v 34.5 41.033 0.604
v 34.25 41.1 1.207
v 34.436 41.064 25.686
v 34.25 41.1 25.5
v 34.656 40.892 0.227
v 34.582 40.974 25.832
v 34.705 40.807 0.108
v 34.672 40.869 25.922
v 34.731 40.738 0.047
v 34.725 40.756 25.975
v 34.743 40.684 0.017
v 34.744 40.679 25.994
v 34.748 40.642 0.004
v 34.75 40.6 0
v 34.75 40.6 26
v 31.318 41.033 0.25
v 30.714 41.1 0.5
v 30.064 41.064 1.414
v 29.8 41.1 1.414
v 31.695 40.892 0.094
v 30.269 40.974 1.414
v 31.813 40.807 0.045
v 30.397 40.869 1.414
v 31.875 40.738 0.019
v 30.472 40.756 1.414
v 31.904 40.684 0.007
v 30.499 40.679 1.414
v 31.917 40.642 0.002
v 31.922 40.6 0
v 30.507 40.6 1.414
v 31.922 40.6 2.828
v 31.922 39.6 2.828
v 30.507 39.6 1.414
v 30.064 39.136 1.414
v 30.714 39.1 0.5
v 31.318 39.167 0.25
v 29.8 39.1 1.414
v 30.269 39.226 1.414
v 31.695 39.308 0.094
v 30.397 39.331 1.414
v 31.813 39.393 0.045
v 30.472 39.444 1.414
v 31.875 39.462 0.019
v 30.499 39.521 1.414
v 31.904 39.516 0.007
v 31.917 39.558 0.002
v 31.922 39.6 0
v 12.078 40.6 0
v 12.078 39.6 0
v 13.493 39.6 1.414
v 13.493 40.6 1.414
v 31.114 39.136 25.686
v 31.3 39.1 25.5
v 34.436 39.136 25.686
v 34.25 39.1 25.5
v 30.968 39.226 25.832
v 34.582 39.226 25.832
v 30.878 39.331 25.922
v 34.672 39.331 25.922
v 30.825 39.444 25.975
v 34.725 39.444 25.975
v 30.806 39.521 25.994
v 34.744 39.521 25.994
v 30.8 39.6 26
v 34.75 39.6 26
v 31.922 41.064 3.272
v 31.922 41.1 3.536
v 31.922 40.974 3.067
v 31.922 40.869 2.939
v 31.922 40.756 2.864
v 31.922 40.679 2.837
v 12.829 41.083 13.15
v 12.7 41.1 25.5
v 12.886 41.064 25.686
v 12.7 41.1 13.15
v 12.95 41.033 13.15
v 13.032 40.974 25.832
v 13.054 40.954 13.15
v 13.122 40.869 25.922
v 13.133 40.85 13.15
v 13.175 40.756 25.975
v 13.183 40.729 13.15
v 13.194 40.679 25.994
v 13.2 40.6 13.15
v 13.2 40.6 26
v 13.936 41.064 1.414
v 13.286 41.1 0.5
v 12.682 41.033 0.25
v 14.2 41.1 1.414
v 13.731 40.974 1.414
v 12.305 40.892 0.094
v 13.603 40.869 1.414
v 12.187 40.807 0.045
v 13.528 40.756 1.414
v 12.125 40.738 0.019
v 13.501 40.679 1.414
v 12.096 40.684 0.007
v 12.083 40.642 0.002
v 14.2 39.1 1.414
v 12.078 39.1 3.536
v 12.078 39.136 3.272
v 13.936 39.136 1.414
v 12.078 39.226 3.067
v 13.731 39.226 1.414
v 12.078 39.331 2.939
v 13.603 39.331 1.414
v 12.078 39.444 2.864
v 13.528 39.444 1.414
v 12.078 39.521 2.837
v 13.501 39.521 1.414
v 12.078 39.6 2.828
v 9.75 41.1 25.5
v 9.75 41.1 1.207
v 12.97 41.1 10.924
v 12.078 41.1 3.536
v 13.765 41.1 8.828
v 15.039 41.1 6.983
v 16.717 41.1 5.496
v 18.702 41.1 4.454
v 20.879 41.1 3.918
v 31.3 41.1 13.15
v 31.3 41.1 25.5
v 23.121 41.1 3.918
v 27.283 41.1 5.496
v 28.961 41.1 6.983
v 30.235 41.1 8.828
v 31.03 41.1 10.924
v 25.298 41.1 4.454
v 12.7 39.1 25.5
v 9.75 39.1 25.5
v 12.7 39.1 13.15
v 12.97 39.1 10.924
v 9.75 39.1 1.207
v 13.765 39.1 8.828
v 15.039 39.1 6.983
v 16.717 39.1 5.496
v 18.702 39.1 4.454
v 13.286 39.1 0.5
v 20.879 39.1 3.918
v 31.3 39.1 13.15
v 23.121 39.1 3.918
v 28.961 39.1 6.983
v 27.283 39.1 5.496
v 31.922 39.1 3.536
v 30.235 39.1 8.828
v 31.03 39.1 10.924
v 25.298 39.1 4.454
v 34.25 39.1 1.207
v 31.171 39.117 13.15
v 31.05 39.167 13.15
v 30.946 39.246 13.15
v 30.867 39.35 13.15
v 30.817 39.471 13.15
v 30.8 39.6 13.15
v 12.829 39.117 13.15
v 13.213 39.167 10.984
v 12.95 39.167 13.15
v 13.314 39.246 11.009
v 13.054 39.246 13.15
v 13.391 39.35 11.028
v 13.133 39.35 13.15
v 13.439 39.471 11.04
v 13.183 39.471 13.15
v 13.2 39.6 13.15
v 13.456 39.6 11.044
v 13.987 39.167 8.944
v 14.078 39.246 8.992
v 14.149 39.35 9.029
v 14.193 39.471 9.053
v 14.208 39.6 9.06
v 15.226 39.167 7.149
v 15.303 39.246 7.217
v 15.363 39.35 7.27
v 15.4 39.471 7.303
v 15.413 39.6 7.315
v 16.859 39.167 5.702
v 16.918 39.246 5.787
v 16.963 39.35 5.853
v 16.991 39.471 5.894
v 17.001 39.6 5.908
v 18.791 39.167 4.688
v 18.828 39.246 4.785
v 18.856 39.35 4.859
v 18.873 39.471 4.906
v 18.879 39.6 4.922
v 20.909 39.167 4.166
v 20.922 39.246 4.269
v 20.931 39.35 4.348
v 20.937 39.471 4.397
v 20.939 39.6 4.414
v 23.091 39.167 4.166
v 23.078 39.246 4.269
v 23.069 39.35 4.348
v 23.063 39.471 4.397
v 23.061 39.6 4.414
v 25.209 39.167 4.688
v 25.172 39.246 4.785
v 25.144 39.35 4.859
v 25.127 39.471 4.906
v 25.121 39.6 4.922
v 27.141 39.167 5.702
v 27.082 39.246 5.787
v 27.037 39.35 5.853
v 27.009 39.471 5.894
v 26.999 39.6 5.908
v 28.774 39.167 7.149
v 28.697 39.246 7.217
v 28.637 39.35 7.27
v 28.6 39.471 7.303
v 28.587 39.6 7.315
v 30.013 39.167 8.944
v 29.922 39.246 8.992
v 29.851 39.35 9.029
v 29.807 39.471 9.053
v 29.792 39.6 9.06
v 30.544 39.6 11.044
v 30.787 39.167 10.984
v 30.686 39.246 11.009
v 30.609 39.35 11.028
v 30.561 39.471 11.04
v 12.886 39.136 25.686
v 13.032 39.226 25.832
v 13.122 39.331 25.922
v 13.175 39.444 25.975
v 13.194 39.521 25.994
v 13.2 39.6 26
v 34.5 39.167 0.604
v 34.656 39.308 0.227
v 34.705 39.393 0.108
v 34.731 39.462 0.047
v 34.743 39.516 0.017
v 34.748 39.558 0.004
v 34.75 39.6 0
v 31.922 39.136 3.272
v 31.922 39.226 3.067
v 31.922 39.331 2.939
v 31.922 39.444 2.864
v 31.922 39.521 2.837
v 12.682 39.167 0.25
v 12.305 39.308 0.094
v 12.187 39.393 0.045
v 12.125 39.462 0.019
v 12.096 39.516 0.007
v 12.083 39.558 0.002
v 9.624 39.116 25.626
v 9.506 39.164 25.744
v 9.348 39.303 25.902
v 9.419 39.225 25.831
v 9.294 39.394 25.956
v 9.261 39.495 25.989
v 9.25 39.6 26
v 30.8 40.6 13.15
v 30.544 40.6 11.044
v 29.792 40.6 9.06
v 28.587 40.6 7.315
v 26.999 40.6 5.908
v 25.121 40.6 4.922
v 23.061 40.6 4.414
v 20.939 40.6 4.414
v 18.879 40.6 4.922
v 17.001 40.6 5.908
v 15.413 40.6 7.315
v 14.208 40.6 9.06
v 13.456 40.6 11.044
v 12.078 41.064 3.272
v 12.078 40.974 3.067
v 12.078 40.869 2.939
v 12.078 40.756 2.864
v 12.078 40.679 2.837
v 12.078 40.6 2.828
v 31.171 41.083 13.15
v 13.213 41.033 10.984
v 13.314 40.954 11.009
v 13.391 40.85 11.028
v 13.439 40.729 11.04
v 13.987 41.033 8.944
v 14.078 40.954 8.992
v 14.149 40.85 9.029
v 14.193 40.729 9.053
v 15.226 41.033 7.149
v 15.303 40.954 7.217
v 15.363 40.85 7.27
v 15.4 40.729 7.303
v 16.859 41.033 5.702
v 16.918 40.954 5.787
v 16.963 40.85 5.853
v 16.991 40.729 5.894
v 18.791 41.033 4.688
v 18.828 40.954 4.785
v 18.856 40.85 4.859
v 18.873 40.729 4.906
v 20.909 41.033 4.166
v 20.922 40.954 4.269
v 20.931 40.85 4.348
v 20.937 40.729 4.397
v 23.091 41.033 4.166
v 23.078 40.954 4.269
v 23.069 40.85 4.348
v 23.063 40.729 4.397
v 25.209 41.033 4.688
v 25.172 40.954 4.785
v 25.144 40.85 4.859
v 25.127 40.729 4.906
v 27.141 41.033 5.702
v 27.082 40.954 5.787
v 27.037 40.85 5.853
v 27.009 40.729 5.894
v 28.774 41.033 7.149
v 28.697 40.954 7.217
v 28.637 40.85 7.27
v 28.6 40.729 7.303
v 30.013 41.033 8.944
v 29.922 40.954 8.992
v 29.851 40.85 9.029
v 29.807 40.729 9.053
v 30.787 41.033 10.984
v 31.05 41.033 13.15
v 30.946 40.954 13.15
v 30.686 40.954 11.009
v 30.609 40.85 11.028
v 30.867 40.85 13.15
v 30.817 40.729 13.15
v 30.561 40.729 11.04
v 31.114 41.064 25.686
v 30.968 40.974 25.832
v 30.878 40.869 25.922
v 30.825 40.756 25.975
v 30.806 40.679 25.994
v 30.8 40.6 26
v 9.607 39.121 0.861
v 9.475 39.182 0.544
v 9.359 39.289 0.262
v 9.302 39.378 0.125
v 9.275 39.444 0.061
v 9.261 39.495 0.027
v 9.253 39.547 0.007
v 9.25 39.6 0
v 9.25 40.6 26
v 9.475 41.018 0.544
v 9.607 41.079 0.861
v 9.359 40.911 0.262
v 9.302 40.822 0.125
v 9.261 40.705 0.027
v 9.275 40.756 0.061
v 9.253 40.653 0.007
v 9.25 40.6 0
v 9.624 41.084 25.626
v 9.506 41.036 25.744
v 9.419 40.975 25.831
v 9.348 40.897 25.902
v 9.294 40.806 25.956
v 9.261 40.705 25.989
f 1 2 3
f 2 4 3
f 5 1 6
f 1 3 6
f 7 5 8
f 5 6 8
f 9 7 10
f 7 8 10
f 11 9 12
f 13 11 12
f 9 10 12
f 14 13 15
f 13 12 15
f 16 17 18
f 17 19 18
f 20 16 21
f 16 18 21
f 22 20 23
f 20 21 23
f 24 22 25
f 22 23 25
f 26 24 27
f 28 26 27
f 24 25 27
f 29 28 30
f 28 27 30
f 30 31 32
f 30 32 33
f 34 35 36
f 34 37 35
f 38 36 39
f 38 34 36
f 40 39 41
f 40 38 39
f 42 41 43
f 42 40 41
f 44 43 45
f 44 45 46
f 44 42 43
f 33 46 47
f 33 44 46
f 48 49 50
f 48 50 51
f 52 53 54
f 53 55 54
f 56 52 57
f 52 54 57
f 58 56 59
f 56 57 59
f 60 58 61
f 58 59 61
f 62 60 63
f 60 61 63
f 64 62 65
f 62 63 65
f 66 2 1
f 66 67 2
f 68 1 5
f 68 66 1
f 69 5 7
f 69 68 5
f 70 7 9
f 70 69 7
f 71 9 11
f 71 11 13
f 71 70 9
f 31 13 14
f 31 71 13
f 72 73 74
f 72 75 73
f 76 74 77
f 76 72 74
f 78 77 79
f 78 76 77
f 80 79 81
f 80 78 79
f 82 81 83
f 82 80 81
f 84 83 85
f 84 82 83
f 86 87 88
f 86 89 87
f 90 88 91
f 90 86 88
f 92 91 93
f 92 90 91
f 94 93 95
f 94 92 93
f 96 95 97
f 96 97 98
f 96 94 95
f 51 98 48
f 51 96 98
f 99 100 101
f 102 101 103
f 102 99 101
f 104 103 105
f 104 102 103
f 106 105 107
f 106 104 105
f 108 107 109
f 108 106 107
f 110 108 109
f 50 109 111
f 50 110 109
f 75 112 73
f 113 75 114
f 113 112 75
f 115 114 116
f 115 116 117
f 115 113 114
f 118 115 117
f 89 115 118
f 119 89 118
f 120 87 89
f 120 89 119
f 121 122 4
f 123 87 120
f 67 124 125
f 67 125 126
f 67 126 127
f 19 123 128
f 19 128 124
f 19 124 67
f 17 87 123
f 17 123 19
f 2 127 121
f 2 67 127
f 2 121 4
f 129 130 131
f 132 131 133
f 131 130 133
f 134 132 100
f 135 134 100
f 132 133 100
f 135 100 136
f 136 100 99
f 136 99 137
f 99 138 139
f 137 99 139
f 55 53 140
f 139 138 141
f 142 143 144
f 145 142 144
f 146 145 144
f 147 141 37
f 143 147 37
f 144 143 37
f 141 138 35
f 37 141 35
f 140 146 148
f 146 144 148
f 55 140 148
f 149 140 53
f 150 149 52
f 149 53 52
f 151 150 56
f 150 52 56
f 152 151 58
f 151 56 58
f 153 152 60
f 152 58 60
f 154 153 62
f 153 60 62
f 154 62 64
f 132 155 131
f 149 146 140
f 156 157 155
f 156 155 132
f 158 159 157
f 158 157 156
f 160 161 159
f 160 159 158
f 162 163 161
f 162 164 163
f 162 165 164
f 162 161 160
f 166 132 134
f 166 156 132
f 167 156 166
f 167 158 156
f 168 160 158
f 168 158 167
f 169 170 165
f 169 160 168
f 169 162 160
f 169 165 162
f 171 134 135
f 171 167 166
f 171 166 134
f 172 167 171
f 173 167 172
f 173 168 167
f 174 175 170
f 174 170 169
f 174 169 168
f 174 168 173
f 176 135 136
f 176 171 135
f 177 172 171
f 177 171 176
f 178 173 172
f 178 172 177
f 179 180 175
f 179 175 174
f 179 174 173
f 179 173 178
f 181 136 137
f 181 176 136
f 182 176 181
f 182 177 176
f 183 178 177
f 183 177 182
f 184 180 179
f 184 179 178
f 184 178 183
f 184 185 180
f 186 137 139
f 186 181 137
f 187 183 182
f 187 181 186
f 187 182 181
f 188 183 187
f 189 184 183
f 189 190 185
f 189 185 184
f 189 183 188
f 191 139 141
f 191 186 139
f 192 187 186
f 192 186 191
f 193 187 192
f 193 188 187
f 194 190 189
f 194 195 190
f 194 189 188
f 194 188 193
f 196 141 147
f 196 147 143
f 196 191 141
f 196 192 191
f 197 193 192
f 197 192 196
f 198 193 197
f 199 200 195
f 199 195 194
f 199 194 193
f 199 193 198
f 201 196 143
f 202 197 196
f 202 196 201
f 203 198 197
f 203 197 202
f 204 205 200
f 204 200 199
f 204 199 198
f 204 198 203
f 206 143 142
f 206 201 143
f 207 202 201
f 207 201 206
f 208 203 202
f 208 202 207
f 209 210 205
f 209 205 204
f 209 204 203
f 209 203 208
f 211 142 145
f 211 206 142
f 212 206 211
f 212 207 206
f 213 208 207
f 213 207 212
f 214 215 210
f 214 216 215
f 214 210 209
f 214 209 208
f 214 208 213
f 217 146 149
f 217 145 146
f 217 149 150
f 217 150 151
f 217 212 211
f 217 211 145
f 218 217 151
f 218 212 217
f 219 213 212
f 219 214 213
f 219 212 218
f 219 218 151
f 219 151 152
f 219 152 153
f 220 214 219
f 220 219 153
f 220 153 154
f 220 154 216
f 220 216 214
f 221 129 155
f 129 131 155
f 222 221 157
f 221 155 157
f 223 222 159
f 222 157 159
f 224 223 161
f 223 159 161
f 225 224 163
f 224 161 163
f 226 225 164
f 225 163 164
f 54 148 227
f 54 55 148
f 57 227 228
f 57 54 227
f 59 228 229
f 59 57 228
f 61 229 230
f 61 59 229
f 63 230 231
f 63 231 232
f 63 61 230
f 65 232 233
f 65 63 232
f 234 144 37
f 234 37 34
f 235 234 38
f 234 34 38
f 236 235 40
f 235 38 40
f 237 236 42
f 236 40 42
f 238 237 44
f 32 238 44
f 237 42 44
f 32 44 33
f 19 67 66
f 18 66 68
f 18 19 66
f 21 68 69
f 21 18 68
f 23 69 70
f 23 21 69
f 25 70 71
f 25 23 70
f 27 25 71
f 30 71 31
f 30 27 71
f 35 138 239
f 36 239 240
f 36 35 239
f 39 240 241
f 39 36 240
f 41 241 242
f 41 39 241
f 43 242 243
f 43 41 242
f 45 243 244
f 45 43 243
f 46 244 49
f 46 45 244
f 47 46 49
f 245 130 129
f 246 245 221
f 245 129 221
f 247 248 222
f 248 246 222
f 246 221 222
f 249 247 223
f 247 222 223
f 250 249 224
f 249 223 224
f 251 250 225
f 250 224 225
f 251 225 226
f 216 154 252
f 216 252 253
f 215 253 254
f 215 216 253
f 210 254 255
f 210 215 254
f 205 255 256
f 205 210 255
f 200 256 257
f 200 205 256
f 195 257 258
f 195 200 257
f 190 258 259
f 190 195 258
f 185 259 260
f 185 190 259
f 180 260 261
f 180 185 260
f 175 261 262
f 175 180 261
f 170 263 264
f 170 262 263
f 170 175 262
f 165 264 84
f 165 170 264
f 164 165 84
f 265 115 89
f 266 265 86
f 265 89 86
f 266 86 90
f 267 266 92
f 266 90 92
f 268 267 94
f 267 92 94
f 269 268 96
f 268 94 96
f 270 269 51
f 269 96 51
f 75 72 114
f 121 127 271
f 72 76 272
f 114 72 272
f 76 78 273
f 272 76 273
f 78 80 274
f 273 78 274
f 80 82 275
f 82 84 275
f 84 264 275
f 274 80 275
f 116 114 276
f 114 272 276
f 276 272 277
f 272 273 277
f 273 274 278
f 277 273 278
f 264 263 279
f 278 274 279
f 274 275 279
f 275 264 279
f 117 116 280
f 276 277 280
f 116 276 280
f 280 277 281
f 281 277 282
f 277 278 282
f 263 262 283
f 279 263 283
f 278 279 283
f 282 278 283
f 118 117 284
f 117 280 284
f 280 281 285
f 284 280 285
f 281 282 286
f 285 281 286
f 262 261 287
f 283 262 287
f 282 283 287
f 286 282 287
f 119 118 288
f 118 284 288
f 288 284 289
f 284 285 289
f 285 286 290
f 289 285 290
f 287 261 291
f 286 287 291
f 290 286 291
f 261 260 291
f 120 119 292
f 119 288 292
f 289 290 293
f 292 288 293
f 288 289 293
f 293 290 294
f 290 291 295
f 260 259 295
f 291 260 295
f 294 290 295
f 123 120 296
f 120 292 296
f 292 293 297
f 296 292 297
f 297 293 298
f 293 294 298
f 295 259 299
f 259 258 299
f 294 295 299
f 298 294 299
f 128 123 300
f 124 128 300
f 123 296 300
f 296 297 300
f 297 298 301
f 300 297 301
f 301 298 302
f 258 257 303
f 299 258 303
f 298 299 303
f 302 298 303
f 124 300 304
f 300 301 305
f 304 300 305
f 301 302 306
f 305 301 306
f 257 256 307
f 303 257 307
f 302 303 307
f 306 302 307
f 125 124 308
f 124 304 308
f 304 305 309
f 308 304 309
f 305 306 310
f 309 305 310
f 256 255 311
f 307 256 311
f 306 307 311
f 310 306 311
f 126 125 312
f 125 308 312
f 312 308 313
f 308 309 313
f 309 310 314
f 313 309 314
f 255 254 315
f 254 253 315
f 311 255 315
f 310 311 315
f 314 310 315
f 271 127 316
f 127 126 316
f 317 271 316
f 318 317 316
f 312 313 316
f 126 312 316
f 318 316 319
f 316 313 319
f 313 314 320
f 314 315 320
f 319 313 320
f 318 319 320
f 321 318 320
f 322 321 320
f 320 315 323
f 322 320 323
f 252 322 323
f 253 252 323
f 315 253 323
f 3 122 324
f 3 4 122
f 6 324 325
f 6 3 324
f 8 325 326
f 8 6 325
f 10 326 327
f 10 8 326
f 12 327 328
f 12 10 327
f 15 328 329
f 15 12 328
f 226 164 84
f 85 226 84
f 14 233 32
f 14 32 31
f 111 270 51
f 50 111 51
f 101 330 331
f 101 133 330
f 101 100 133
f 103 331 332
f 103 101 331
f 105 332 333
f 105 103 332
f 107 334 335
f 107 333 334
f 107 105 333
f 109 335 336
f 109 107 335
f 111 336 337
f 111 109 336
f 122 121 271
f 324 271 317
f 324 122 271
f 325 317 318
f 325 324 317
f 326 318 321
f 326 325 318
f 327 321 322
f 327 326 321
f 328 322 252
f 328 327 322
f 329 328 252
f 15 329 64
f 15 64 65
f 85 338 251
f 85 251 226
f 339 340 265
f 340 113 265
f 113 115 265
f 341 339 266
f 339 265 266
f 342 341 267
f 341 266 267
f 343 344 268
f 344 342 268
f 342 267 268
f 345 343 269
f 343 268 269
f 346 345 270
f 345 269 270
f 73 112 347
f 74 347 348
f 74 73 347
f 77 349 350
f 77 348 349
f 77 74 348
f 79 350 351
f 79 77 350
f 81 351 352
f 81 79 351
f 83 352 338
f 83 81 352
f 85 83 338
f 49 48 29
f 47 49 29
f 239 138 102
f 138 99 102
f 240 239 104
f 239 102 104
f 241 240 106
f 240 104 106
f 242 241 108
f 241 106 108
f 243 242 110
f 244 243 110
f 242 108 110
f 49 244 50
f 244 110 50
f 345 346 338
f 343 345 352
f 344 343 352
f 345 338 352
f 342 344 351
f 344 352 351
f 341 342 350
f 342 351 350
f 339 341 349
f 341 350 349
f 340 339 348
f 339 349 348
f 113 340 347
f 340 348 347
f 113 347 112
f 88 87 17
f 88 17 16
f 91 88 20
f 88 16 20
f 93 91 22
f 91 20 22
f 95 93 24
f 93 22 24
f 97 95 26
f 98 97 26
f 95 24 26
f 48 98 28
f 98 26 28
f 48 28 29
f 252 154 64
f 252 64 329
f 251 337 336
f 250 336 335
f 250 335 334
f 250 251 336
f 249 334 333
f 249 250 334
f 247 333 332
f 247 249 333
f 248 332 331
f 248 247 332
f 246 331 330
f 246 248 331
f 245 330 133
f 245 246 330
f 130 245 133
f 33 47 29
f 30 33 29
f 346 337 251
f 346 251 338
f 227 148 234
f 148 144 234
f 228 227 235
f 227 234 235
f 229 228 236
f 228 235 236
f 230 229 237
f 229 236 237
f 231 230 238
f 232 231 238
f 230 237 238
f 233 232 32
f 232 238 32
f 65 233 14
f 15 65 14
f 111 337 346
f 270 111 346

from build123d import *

# Parameters (mm, degrees)
BOX026_W               = 2
BOX026_H               = 2
BOX026_DEPTH           = 4
BOX026_PLACEMENT_ANGLE = 45
BOX027_W               = 2
BOX027_H               = 2
BOX027_DEPTH           = 4
BOX027_PLACEMENT_ANGLE = 45
BOX025_W               = 17.6
BOX025_H               = 2
BOX025_DEPTH           = 12.85
CYLINDER063_R          = 8.8
CYLINDER063_DEPTH      = 2
BOX024_W               = 25.5
BOX024_H               = 2
BOX024_DEPTH           = 26
FILLET_R               = 0.5


with BuildPart() as noutletkeynotch:
    # Box026 → Box026 (new body)
    with BuildSketch(Plane.XY):
        with Locations((1, 1)):
            Rectangle(BOX026_W, BOX026_H)
    extrude(amount=BOX026_DEPTH)


with BuildPart() as noutletkeynotch_1:
    # Box026 placement: moved
    add(noutletkeynotch.part.moved(Location((-12.75, 0, -13.15))).rotate(Axis((-12.75, 0, -13.15), (0, 1, 0)), BOX026_PLACEMENT_ANGLE))


with BuildPart() as noutletkeynotch2:
    # Part__Mirroring006: instance of nOutletKeyNotch
    add(noutletkeynotch_1.part.mirror(Plane(origin=(0, 0, 0), x_dir=(0, -1, 0), z_dir=(1, 0, 0))))


with BuildPart() as noutletkeynotch1:
    # Box027 → Box027 (new body)
    with BuildSketch(Plane.XY):
        with Locations((1, 1)):
            Rectangle(BOX027_W, BOX027_H)
    extrude(amount=BOX027_DEPTH)


with BuildPart() as noutletkeynotch1_1:
    # Box027 placement: moved
    add(noutletkeynotch1.part.moved(Location((-12.75, 0, -13.15))).rotate(Axis((-12.75, 0, -13.15), (0, 1, 0)), BOX027_PLACEMENT_ANGLE))


with BuildPart() as noutletkeyrect:
    # Box025 → Box025 (new body)
    with BuildSketch(Plane(origin=(-8.8, 0, 0), x_dir=(1, 0, 0), z_dir=(0, 0, 1))):
        with Locations((8.8, 1)):
            Rectangle(BOX025_W, BOX025_H)
    extrude(amount=BOX025_DEPTH)


with BuildPart() as noutletkey:
    # Cylinder063 → Cylinder063 (new body)
    with BuildSketch(Plane(origin=(0, 0, 0), x_dir=(1, 0, 0), z_dir=(0, 1, 0))):
        Circle(CYLINDER063_R)
    extrude(amount=CYLINDER063_DEPTH)

    # Fusion062: union nOutletKeyNotch2, nOutletKeyNotch1, nOutletKeyRect
    add(noutletkeynotch2.part)
    add(noutletkeynotch1_1.part)
    add(noutletkeyrect.part)


with BuildPart() as toplevelpart_outletkey:
    # Box024 → Box024 (new body)
    with BuildSketch(Plane(origin=(-12.75, 0, -13.15), x_dir=(1, 0, 0), z_dir=(0, 0, 1))):
        with Locations((12.75, 1)):
            Rectangle(BOX024_W, BOX024_H)
    extrude(amount=BOX024_DEPTH)

    # Cut021: cut nOutletKey
    add(noutletkey.part, mode=Mode.SUBTRACT)

    # Fillet
    fillet_edges = [toplevelpart_outletkey.edges().sort_by_distance(p)[0] for p in [
        (-12.75, 0, -0.15),
        (-12.75, 2, -0.15),
        (-11.335786, 0, -11.735786),
        (-9.214466, 0, -11.02868),
        (-9.214466, 0, -12.442893),
        (0, 0, -13.15),
        (9.214466, 0, -12.442893),
        (9.214466, 0, -11.02868),
        (11.335786, 0, -11.735786),
        (12.75, 0, -0.15),
        (10.775, 0, 12.85),
        (8.8, 0, 6.425),
        (0, 0, -8.8),
        (-8.8, 0, 6.425),
        (-10.775, 0, 12.85),
        (-10.775, 2, 12.85),
        (-11.335786, 2, -11.735786),
        (-9.214466, 2, -11.02868),
        (-9.214466, 2, -12.442893),
        (0, 2, -13.15),
        (9.214466, 2, -12.442893),
        (9.214466, 2, -11.02868),
        (11.335786, 2, -11.735786),
        (12.75, 2, -0.15),
        (10.775, 2, 12.85),
        (8.8, 2, 6.425),
        (0, 2, -8.8),
        (-8.8, 2, 6.425),
    ]]
    fillet(fillet_edges, radius=FILLET_R)


with BuildPart() as toplevelpart_outletkey_1:
    # Fillet placement: moved
    add(toplevelpart_outletkey.part.moved(Location((22, 39.1, 13.15))))


solid = toplevelpart_outletkey_1.part
